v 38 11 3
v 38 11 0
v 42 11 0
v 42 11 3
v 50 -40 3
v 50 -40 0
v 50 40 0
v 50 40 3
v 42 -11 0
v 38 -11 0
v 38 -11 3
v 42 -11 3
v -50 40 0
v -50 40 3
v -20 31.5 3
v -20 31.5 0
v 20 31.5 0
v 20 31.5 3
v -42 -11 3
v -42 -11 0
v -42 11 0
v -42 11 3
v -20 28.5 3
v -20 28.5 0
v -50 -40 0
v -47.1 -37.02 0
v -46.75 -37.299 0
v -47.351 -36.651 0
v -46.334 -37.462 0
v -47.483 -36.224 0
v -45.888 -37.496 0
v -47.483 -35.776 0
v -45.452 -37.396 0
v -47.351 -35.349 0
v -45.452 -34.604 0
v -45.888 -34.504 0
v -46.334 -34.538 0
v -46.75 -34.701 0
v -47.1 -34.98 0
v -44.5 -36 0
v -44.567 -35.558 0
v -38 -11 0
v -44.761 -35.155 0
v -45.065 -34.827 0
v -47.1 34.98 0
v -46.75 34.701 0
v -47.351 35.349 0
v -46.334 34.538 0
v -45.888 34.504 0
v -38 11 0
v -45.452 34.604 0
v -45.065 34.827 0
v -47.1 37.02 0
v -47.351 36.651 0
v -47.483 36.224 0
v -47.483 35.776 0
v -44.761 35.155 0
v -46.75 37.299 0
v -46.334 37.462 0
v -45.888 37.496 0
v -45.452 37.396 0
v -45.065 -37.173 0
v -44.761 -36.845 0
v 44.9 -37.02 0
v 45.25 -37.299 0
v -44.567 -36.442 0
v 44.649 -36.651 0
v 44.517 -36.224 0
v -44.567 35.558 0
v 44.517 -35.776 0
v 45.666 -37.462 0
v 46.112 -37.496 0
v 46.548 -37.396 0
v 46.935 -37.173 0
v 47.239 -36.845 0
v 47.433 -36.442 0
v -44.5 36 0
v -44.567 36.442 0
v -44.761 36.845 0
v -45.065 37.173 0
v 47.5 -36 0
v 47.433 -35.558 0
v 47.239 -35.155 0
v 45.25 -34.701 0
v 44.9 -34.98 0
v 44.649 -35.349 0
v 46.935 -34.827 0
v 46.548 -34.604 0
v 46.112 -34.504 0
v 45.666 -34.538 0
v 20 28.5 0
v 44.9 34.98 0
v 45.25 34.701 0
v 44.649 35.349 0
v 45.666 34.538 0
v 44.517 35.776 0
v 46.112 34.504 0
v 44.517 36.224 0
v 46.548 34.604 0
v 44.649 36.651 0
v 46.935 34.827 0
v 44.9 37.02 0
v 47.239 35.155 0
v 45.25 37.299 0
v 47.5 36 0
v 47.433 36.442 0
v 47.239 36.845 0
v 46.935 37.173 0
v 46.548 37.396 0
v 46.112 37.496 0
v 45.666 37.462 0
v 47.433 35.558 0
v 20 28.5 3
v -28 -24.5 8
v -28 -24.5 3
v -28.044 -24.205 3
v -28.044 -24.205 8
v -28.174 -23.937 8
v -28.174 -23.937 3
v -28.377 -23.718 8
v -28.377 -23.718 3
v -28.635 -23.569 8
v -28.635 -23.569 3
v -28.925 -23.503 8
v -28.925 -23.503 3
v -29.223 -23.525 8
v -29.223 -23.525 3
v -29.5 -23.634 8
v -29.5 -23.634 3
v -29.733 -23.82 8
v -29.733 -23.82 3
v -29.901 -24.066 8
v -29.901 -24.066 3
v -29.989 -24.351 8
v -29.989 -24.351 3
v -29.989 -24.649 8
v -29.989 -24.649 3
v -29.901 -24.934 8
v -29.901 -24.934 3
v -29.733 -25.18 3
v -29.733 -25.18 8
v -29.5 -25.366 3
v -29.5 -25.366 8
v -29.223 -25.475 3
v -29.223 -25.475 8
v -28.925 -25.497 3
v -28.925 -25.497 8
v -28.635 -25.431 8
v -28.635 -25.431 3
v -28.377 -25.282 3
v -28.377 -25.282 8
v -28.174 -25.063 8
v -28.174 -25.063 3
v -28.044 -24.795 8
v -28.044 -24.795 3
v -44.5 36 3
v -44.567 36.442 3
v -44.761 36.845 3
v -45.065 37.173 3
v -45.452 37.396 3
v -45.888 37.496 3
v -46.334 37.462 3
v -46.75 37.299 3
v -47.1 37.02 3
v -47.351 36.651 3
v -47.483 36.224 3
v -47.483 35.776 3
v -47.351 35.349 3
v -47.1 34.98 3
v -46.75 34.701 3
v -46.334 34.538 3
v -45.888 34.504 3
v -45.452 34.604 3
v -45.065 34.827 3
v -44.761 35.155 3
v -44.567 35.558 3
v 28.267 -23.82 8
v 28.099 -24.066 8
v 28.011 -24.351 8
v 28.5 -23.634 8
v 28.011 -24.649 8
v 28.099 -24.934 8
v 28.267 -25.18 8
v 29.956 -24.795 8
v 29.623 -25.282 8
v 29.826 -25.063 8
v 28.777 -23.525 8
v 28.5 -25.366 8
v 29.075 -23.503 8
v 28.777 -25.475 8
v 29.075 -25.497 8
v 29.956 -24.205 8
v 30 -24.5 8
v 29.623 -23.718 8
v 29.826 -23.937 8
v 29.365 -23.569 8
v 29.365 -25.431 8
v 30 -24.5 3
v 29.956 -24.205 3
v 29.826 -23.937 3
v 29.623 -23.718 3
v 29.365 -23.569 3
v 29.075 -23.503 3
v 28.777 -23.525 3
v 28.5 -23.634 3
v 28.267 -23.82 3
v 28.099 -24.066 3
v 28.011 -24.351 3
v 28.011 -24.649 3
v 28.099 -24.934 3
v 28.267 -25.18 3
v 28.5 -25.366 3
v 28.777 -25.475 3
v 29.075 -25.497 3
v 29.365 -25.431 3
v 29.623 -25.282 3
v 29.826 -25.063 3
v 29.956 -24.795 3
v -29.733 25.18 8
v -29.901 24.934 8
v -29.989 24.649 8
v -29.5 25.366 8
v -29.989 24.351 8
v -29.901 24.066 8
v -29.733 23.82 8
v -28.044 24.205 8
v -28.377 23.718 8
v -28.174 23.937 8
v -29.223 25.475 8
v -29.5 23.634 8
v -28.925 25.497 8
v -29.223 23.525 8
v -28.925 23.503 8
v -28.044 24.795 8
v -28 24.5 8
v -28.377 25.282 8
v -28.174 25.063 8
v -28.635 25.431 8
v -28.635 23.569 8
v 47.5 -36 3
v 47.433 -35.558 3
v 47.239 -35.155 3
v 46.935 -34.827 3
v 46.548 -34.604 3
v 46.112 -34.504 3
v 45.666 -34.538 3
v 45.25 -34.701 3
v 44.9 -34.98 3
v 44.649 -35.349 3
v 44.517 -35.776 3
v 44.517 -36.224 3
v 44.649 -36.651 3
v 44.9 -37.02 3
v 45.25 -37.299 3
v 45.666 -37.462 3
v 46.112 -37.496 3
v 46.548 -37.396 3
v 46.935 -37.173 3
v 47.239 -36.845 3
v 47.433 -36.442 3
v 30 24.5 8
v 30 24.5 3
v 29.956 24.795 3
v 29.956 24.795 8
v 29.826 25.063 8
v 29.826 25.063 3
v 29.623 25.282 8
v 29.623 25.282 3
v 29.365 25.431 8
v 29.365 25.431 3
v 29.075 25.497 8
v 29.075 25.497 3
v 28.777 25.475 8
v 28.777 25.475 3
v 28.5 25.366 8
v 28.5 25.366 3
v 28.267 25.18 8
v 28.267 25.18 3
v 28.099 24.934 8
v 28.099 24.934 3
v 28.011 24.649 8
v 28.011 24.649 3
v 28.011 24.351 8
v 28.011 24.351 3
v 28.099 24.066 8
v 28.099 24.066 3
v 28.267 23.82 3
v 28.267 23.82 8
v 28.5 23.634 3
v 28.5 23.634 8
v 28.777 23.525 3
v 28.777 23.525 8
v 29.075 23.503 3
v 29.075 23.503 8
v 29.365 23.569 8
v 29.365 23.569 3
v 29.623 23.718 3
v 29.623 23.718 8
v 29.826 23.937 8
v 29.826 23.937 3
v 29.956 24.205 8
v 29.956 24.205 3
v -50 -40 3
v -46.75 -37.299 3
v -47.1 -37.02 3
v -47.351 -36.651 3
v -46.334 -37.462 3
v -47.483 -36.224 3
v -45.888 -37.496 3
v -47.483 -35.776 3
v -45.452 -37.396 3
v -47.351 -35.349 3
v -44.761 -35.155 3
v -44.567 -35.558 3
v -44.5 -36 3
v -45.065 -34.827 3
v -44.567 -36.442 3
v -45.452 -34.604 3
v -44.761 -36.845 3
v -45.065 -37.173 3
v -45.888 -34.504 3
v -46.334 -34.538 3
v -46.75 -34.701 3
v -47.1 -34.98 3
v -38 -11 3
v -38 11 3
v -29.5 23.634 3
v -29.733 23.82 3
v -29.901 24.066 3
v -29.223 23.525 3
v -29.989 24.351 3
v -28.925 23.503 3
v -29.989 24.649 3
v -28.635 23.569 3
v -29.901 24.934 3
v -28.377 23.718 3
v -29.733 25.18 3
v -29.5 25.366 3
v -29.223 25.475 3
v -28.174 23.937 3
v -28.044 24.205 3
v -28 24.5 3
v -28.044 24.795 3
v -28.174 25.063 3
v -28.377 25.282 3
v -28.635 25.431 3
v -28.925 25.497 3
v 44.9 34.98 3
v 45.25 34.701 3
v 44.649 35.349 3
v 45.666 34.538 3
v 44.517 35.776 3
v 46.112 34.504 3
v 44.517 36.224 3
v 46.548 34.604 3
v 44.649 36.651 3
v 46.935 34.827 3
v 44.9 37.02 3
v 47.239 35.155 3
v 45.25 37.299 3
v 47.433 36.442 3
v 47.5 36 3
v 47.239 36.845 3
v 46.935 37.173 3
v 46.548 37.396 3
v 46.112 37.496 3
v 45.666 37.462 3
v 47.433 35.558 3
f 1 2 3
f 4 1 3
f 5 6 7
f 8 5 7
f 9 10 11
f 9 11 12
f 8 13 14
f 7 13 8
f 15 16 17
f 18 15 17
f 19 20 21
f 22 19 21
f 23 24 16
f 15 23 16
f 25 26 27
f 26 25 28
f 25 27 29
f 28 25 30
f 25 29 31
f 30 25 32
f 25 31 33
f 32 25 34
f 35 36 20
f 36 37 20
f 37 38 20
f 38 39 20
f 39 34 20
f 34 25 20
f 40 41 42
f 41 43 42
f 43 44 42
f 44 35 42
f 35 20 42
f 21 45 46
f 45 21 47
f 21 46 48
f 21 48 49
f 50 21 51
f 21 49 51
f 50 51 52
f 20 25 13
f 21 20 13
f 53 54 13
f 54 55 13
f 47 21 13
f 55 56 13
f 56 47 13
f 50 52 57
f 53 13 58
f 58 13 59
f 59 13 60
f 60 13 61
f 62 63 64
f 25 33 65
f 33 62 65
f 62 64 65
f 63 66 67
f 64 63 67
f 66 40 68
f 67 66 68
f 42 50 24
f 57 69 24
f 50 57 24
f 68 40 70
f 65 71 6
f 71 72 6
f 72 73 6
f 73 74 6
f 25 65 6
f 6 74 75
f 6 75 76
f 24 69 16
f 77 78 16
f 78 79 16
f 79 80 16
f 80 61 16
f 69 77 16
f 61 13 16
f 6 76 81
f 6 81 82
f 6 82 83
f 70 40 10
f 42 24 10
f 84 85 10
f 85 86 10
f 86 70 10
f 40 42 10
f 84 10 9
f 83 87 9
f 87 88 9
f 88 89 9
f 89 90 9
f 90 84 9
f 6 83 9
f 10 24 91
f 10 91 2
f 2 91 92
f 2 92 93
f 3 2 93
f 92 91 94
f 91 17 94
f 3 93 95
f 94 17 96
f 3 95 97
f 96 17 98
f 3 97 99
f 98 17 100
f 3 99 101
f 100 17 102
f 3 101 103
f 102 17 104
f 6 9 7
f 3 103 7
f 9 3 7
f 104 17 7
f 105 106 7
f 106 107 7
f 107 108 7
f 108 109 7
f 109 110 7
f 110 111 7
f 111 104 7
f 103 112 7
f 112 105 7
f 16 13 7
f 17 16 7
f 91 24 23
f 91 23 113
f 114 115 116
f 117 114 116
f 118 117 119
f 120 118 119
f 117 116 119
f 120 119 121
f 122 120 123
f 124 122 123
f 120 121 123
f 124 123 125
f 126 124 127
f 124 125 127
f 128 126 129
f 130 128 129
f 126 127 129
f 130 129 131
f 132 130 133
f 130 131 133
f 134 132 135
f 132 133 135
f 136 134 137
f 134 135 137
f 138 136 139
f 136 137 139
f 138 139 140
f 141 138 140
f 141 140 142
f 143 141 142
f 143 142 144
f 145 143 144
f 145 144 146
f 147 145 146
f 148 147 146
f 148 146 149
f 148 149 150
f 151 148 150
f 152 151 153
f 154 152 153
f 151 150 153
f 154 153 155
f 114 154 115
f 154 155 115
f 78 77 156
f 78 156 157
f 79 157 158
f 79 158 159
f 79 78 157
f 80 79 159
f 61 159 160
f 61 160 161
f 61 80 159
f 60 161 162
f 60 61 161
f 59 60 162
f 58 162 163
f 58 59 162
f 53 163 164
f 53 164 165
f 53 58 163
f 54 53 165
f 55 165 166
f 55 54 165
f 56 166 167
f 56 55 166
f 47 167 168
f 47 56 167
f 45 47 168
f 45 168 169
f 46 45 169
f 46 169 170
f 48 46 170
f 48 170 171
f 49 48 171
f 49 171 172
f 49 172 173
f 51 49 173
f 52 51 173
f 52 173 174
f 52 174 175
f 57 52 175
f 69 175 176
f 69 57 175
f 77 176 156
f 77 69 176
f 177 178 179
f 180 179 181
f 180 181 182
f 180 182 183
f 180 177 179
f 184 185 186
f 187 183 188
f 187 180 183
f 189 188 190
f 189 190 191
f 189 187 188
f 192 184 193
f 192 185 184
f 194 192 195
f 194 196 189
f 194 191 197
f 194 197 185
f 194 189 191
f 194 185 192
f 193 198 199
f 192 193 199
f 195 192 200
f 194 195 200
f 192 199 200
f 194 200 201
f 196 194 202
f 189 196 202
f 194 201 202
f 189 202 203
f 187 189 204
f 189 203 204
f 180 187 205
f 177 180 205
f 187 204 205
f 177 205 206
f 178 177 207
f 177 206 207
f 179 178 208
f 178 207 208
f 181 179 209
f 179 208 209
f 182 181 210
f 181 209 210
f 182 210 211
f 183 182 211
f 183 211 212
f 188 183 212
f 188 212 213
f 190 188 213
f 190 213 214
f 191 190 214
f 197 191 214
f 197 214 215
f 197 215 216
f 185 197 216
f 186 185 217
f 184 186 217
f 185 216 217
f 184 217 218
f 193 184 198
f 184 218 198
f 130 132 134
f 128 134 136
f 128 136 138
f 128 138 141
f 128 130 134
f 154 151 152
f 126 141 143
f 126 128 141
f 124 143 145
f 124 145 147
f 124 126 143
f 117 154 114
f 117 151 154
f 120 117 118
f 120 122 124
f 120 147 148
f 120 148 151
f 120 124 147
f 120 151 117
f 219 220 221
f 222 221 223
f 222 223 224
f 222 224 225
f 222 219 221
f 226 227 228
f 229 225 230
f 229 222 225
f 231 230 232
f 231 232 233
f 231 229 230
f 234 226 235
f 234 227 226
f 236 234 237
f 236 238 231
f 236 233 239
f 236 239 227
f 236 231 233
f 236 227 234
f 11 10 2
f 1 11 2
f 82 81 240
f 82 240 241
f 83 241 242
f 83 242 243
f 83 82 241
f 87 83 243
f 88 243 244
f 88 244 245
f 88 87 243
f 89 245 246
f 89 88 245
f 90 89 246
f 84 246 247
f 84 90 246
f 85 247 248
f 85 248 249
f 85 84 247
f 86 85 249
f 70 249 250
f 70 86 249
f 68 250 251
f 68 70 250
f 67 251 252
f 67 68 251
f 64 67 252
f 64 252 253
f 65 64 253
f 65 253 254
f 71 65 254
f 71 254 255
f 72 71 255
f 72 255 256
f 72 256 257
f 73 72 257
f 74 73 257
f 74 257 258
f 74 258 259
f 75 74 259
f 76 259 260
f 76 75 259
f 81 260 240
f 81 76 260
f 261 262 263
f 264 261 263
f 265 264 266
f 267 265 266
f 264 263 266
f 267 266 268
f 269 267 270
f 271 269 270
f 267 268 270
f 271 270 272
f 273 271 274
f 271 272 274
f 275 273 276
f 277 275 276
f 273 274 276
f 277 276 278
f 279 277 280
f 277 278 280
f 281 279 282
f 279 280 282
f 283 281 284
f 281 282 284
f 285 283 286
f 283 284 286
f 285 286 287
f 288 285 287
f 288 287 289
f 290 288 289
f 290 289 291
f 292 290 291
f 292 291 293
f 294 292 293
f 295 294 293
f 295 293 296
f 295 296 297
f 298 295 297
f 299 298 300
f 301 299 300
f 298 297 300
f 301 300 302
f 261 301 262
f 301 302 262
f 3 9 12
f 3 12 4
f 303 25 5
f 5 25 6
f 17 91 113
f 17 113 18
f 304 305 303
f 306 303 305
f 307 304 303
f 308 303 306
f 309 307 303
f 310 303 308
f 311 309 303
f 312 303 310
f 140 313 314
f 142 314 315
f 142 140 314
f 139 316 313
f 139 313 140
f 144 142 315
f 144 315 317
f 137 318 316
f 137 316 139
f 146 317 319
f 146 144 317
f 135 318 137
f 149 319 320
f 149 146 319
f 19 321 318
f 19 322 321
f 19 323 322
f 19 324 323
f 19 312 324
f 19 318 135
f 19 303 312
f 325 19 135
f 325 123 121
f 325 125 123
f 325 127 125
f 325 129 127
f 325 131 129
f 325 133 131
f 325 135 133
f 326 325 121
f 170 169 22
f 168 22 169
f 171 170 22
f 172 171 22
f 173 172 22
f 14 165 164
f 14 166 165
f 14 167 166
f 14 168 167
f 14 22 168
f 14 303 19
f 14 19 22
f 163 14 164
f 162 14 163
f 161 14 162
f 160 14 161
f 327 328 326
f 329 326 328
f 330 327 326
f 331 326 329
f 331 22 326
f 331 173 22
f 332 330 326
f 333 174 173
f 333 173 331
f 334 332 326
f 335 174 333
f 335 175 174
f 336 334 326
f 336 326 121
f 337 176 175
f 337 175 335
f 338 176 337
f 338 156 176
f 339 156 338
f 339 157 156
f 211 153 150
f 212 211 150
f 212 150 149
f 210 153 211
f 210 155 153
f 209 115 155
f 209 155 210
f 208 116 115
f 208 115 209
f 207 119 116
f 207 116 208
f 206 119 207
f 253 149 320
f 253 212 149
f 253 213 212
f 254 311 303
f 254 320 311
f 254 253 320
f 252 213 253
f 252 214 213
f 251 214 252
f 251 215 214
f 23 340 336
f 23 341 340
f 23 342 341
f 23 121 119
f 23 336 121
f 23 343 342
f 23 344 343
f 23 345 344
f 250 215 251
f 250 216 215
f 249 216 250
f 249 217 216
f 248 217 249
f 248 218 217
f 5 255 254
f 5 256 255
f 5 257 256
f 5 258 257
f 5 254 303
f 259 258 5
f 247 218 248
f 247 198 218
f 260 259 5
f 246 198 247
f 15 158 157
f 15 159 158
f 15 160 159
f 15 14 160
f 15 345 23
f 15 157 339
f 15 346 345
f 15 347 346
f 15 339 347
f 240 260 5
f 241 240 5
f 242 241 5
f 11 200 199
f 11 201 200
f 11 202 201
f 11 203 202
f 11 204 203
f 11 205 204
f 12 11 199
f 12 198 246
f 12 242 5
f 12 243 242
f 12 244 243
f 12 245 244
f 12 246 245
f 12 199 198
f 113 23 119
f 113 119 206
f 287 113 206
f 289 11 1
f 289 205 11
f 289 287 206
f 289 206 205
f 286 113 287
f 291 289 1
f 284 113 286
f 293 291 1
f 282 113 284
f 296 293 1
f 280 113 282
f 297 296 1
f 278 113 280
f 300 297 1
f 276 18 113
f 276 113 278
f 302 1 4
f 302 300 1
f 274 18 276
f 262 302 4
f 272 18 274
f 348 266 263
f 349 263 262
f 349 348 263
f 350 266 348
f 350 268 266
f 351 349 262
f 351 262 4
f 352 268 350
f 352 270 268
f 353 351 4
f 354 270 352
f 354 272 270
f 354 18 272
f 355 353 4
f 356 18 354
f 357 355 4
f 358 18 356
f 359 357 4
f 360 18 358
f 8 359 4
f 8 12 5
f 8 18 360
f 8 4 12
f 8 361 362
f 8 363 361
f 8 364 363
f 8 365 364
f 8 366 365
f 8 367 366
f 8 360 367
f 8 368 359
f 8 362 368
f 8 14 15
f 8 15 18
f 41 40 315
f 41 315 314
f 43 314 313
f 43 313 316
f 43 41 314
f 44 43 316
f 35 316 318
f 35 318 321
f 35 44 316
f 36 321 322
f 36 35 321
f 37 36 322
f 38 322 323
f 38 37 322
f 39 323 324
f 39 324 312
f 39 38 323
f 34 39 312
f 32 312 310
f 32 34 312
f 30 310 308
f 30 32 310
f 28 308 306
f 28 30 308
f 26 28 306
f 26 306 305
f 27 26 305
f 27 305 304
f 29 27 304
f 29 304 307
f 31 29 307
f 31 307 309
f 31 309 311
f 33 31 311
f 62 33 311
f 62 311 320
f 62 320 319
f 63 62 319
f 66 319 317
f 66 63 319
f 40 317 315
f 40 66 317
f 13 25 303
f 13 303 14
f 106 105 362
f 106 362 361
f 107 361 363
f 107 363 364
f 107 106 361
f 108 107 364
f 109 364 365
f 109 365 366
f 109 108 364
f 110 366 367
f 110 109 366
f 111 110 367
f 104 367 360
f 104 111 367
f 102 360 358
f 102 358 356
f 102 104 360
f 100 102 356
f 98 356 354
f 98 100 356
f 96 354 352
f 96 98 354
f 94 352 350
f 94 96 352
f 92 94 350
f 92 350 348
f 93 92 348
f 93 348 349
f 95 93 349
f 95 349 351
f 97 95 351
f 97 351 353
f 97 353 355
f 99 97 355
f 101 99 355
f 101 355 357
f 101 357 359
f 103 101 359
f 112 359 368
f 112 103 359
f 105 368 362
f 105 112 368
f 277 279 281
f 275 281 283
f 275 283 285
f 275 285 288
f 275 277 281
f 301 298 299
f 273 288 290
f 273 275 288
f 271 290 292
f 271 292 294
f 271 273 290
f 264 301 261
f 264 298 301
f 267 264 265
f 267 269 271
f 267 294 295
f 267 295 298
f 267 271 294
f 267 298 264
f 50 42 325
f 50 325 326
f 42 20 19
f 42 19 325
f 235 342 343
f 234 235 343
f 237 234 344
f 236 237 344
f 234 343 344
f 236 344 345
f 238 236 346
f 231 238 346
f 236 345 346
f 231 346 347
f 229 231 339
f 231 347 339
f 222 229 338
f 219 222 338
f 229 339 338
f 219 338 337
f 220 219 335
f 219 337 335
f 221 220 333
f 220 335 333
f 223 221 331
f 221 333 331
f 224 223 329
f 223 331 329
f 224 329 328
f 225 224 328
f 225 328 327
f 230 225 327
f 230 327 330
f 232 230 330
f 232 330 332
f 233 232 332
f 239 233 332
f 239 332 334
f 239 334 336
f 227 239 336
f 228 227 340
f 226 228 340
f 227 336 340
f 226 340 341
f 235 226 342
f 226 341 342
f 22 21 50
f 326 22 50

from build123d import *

# Parameters (mm, degrees)
ESQUISSE1_W        = 100
ESQUISSE1_H        = 80
ESQUISSE1_R        = 1.5
ESQUISSE1_W_2      = 4
ESQUISSE1_H_2      = 22
ESQUISSE1_W_3      = 40
ESQUISSE1_H_3      = 3
BOSS_EXTRU_1_DEPTH = 3
ESQUISSE2_R        = 1
BOSS_EXTRU_2_DEPTH = 5


with BuildPart() as part:
    # Esquisse1 → Boss.-Extru.1 (new body)
    with BuildSketch(Plane.XY):
        Rectangle(ESQUISSE1_W, ESQUISSE1_H)
        with Locations((-46, 36)):
            Circle(ESQUISSE1_R, mode=Mode.SUBTRACT)
        with Locations((46, 36)):
            Circle(ESQUISSE1_R, mode=Mode.SUBTRACT)
        with Locations((46, -36)):
            Circle(ESQUISSE1_R, mode=Mode.SUBTRACT)
        with Locations((-46, -36)):
            Circle(ESQUISSE1_R, mode=Mode.SUBTRACT)
        with Locations((-40, 0)):
            Rectangle(ESQUISSE1_W_2, ESQUISSE1_H_2, mode=Mode.SUBTRACT)
        with Locations((40, 0)):
            Rectangle(ESQUISSE1_W_2, ESQUISSE1_H_2, mode=Mode.SUBTRACT)
        with Locations((0, 30)):
            Rectangle(ESQUISSE1_W_3, ESQUISSE1_H_3, mode=Mode.SUBTRACT)
    extrude(amount=BOSS_EXTRU_1_DEPTH)

    # Esquisse2 → Boss.-Extru.2 (add)
    with BuildSketch(Plane.XY.offset(3)):
        with Locations((-29, 24.5)):
            Circle(ESQUISSE2_R)
        with Locations((29, 24.5)):
            Circle(ESQUISSE2_R)
        with Locations((29, -24.5)):
            Circle(ESQUISSE2_R)
        with Locations((-29, -24.5)):
            Circle(ESQUISSE2_R)
    extrude(amount=BOSS_EXTRU_2_DEPTH)


solid = part.part
